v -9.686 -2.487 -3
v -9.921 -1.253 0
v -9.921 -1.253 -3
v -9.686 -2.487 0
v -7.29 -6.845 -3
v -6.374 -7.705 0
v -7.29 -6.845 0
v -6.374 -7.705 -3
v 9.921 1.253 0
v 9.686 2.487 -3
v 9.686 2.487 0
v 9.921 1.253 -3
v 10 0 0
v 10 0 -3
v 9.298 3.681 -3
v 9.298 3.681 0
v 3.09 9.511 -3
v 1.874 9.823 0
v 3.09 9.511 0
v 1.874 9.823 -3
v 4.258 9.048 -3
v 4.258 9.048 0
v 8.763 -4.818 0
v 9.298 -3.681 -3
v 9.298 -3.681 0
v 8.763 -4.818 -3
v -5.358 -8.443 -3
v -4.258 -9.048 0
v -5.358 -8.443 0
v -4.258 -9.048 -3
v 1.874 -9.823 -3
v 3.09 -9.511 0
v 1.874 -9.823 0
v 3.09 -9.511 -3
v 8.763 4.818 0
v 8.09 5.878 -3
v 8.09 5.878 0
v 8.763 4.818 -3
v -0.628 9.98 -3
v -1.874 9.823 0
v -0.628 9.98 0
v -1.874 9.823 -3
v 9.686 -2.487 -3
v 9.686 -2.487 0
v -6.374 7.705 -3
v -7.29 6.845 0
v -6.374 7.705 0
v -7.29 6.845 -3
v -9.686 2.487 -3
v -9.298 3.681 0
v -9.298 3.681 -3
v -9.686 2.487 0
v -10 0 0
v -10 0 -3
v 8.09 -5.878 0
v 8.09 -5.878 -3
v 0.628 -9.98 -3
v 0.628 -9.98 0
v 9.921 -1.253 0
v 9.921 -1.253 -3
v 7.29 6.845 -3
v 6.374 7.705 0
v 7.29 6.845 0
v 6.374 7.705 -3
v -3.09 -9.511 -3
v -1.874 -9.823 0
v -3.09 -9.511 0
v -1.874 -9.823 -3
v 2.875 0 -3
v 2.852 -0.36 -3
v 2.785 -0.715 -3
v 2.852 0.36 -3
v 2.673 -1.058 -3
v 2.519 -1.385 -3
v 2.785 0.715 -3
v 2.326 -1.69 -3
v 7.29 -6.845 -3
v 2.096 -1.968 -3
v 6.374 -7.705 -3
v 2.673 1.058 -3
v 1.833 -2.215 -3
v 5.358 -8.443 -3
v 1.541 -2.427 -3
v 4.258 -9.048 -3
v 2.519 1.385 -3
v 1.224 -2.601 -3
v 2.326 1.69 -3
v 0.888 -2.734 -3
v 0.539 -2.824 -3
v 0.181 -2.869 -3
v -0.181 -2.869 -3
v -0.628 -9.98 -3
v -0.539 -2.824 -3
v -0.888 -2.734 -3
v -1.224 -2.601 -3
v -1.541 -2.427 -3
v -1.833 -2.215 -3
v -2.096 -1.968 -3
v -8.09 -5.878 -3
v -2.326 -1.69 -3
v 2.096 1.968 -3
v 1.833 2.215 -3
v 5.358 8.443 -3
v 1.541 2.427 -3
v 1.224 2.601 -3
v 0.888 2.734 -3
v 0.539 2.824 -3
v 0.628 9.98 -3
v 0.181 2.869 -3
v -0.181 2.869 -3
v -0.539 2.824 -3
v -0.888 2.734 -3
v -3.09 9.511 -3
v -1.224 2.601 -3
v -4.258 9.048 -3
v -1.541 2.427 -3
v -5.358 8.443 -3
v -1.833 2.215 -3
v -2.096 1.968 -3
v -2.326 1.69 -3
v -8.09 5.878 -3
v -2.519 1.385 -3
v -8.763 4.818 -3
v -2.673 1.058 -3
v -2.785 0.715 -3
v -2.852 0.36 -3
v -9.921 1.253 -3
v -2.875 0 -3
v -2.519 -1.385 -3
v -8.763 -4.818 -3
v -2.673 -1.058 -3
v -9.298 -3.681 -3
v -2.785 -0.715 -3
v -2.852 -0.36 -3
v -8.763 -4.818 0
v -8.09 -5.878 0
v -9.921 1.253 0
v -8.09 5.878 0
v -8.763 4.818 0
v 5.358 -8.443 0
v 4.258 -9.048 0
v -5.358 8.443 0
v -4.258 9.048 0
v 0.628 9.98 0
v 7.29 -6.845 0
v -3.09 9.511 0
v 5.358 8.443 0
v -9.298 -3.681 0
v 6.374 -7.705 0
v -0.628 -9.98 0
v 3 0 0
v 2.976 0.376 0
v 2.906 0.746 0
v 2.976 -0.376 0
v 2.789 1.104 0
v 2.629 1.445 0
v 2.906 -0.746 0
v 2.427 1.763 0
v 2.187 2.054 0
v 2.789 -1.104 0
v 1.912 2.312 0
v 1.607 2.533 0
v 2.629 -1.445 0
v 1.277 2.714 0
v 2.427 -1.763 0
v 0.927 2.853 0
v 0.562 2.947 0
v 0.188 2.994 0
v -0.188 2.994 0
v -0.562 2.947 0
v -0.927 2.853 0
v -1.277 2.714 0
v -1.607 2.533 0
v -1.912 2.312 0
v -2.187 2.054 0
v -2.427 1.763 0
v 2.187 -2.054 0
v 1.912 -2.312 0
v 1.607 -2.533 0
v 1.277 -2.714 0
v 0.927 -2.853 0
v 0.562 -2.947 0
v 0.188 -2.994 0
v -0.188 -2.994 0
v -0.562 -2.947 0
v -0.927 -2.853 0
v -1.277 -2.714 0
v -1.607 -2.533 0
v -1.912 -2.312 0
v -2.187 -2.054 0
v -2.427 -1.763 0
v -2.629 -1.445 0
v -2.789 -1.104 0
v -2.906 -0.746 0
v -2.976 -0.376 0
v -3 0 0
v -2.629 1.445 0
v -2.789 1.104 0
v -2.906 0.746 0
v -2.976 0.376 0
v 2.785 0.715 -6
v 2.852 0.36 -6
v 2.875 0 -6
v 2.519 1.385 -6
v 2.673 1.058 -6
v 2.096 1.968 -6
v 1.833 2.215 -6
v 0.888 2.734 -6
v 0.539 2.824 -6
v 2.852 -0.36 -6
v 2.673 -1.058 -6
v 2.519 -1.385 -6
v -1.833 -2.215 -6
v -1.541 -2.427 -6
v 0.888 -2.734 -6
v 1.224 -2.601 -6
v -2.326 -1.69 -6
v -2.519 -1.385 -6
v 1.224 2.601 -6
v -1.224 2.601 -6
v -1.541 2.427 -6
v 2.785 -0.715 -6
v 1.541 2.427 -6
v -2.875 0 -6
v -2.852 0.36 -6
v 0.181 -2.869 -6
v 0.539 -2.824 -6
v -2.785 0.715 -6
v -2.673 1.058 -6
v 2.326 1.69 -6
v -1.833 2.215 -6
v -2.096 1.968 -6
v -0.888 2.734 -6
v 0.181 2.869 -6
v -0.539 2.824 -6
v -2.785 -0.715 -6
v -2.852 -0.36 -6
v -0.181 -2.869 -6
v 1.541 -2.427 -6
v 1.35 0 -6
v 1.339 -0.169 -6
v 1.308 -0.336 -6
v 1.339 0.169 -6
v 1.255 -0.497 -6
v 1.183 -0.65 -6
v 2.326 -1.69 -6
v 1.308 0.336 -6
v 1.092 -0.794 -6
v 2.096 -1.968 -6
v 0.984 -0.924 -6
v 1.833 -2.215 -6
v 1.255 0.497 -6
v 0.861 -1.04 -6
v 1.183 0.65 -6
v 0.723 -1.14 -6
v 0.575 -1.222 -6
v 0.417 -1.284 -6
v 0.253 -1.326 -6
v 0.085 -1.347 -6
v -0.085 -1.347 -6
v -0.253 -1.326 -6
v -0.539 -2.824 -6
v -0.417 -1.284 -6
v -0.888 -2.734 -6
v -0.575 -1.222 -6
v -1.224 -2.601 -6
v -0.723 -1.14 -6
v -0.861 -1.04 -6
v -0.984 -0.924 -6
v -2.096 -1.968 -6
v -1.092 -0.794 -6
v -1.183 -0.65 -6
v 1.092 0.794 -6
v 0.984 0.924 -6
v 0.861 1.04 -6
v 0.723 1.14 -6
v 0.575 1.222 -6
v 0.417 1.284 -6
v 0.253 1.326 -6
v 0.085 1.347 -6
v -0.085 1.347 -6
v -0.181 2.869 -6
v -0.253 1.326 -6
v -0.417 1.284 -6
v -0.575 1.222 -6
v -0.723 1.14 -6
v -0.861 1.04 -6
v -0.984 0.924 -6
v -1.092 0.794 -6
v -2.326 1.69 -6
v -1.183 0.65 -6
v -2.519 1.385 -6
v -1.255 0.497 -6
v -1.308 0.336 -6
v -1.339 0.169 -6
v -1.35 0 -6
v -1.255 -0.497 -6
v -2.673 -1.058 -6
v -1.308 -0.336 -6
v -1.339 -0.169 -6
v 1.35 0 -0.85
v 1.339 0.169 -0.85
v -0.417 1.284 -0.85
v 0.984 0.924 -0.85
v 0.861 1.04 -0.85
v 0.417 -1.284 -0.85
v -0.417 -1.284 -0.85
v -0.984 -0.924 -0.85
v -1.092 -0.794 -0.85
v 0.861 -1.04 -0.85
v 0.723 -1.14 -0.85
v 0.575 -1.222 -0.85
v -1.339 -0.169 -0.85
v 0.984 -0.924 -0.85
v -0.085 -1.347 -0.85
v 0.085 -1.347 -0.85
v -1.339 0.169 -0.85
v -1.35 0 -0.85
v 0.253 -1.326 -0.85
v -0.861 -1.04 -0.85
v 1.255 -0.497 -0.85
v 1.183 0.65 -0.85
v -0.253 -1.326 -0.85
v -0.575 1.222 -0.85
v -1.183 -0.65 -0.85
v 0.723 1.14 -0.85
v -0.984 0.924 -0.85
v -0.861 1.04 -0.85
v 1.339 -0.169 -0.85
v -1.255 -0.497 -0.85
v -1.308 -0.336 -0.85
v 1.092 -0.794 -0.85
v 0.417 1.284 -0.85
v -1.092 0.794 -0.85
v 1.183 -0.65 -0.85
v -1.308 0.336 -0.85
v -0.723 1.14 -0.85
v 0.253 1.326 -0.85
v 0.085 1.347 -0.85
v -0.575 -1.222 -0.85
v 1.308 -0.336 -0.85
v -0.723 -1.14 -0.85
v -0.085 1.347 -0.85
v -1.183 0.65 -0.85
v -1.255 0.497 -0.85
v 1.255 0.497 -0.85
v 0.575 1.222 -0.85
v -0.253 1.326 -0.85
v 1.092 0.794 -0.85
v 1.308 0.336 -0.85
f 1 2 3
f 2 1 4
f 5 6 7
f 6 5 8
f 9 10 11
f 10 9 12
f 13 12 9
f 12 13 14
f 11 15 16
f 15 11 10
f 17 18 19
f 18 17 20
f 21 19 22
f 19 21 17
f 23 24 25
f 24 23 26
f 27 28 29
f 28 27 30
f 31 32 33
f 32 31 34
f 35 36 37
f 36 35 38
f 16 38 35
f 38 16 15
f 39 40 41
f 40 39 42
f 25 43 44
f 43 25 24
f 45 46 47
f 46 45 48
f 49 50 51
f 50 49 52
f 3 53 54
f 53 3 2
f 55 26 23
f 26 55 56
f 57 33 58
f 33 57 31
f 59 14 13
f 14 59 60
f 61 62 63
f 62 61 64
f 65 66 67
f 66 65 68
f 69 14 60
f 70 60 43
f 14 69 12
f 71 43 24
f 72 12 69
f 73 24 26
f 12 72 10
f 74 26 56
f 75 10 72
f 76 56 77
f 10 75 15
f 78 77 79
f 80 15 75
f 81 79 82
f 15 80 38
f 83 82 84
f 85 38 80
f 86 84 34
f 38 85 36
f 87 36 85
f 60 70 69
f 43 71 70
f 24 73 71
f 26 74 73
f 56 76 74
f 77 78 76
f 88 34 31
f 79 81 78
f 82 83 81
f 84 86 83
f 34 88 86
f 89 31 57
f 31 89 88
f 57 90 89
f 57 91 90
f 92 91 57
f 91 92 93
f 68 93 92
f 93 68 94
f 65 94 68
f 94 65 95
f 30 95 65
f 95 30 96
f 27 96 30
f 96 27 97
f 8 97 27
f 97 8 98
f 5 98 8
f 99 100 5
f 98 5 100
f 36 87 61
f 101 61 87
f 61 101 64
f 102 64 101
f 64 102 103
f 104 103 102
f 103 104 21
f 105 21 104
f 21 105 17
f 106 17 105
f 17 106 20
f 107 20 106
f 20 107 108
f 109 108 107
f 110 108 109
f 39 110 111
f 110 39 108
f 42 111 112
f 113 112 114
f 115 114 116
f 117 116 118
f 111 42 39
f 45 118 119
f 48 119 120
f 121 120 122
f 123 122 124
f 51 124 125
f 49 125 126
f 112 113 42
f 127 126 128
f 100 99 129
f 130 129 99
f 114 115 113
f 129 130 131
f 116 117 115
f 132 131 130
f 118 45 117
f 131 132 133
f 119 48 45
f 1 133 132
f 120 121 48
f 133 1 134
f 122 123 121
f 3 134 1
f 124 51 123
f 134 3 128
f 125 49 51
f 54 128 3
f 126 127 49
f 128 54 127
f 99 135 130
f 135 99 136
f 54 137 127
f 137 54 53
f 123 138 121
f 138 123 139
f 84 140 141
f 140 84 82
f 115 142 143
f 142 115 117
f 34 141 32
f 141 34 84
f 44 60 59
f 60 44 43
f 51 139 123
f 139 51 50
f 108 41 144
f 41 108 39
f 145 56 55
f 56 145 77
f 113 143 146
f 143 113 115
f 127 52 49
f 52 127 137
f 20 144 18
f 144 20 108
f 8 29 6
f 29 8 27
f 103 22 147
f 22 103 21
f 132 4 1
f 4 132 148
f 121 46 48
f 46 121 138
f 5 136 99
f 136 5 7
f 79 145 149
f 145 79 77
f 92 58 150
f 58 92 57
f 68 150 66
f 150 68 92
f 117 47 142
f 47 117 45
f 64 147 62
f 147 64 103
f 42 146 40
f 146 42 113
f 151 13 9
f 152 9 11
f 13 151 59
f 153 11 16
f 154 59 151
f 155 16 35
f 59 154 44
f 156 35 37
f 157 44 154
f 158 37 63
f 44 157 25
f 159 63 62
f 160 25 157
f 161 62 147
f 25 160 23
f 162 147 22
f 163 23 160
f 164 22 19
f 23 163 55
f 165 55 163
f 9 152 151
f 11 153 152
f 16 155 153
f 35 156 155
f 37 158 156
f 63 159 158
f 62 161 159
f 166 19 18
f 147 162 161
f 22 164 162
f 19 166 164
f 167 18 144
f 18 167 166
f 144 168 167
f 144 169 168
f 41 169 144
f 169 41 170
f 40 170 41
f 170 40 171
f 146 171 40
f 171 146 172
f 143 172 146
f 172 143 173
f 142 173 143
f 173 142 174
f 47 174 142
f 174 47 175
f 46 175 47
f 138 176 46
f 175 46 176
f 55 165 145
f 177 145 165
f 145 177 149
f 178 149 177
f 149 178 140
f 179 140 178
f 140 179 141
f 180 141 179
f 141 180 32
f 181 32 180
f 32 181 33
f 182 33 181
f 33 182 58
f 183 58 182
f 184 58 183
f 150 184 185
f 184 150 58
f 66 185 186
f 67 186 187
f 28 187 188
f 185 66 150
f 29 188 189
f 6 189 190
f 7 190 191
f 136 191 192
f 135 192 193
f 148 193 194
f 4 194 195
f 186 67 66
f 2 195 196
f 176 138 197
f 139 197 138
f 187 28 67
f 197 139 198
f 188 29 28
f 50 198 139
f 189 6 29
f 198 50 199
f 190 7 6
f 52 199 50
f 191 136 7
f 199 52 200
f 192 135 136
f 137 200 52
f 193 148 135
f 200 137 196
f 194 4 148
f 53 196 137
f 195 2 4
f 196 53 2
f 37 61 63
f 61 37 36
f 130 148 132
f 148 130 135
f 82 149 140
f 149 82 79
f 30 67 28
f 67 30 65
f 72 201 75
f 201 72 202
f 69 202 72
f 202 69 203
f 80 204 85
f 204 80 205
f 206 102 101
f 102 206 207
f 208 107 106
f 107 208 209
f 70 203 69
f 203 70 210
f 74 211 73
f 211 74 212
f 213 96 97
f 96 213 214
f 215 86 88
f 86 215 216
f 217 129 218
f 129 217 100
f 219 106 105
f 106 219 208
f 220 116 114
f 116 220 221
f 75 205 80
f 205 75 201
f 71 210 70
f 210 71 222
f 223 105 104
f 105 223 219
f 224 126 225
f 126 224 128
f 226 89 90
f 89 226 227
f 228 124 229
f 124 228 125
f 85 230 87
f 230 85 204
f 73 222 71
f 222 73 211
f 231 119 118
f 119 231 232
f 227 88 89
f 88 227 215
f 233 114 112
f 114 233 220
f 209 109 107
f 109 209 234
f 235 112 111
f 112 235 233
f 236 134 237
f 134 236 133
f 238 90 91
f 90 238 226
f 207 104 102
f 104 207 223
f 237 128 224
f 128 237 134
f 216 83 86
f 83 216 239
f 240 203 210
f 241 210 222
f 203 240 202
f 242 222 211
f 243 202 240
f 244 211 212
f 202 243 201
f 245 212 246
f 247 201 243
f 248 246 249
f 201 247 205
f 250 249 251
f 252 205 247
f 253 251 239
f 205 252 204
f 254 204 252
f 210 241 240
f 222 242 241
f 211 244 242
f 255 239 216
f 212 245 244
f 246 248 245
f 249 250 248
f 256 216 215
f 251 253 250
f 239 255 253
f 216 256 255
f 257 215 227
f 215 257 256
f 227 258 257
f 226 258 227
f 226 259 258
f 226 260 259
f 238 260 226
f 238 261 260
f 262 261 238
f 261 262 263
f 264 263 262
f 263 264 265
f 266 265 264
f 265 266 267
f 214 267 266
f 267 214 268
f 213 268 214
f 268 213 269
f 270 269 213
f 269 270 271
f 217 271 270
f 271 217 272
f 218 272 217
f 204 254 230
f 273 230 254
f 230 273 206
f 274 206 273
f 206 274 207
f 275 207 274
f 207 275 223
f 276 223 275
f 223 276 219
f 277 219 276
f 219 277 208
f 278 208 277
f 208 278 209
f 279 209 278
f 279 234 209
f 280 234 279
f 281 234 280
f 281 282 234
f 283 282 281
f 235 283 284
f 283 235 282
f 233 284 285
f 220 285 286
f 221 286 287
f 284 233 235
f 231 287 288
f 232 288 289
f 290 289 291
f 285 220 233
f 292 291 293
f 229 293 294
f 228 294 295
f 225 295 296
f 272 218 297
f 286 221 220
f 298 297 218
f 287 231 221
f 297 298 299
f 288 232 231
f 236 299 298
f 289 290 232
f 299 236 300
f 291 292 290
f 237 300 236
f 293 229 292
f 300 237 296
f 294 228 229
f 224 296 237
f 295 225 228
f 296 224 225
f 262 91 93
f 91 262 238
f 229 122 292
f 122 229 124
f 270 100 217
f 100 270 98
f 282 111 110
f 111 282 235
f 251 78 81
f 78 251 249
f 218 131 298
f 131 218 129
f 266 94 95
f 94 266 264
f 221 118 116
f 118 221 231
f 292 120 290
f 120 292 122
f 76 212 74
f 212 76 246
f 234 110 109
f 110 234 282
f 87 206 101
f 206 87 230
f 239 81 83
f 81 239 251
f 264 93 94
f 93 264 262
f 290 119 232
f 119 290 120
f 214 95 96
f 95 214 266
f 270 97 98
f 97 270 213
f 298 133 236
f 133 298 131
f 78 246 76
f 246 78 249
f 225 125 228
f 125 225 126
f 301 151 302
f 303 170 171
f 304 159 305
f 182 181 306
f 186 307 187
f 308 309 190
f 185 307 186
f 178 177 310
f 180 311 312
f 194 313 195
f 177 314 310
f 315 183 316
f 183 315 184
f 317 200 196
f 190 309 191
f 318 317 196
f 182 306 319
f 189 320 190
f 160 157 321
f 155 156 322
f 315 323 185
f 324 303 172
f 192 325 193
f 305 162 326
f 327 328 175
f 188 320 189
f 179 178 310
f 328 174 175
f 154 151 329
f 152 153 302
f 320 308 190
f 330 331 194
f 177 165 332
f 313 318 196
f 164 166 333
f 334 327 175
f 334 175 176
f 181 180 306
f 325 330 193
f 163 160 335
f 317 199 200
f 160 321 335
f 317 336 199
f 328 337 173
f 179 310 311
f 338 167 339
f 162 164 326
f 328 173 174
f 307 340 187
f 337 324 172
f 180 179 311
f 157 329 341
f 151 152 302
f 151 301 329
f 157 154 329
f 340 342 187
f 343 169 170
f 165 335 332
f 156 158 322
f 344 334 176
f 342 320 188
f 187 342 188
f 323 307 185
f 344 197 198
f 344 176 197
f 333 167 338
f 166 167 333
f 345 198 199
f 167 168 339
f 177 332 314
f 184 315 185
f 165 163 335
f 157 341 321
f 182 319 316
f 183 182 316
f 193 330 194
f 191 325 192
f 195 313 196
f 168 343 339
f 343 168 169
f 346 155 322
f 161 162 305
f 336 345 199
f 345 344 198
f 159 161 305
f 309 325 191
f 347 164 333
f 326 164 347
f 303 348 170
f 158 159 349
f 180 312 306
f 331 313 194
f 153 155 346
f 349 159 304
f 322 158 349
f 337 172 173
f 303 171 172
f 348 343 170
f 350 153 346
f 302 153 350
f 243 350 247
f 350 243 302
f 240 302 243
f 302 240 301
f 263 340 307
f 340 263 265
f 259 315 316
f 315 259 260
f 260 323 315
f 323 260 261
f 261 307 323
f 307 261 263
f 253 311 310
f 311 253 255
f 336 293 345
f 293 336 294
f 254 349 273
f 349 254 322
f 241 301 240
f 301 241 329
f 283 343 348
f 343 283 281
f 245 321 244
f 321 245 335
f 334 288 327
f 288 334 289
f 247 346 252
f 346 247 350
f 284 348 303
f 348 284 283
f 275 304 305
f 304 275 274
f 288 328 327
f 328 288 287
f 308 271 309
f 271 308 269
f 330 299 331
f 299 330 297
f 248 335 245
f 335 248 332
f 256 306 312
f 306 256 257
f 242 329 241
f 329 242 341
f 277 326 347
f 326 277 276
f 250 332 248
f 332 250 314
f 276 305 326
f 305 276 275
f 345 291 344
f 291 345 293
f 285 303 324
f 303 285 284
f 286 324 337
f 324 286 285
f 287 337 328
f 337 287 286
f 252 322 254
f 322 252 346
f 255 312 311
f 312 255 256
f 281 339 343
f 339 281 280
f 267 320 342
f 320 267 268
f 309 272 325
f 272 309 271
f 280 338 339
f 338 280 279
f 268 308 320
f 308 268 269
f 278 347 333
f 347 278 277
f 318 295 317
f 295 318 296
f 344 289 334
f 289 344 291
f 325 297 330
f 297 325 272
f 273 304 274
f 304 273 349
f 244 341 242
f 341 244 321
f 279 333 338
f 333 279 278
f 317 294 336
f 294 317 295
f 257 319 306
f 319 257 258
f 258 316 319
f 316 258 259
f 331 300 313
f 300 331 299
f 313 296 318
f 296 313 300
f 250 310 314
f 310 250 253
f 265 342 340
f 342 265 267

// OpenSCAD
$fn = 50;

difference() {
	union() {
		translate(v = [0, 0, -3.0]) {
			cylinder(h = 3, r = 10.0);
		}
		#translate(v = [0, 0, -6.0]) {
			cylinder(h = 6, r = 2.875);
		}
	}
	union() {
		translate(v = [0, 0, 0]) {
			rotate(a = [0, 0, 0]) {
				difference() {
					union() {
						translate(v = [0, 0, -6.0]) {
							cylinder(h = 6, r = 1.0);
						}
						translate(v = [0, 0, -0.85]) {
							cylinder(h = 0.85, r1 = 1.35, r2 = 3.0);
						}
						translate(v = [0, 0, -6.0]) {
							cylinder(h = 6, r = 1.35);
						}
						translate(v = [0, 0, -6.0]) {
							cylinder(h = 6, r = 1.0);
						}
					}
					union();
				}
			}
		}
	}
}
